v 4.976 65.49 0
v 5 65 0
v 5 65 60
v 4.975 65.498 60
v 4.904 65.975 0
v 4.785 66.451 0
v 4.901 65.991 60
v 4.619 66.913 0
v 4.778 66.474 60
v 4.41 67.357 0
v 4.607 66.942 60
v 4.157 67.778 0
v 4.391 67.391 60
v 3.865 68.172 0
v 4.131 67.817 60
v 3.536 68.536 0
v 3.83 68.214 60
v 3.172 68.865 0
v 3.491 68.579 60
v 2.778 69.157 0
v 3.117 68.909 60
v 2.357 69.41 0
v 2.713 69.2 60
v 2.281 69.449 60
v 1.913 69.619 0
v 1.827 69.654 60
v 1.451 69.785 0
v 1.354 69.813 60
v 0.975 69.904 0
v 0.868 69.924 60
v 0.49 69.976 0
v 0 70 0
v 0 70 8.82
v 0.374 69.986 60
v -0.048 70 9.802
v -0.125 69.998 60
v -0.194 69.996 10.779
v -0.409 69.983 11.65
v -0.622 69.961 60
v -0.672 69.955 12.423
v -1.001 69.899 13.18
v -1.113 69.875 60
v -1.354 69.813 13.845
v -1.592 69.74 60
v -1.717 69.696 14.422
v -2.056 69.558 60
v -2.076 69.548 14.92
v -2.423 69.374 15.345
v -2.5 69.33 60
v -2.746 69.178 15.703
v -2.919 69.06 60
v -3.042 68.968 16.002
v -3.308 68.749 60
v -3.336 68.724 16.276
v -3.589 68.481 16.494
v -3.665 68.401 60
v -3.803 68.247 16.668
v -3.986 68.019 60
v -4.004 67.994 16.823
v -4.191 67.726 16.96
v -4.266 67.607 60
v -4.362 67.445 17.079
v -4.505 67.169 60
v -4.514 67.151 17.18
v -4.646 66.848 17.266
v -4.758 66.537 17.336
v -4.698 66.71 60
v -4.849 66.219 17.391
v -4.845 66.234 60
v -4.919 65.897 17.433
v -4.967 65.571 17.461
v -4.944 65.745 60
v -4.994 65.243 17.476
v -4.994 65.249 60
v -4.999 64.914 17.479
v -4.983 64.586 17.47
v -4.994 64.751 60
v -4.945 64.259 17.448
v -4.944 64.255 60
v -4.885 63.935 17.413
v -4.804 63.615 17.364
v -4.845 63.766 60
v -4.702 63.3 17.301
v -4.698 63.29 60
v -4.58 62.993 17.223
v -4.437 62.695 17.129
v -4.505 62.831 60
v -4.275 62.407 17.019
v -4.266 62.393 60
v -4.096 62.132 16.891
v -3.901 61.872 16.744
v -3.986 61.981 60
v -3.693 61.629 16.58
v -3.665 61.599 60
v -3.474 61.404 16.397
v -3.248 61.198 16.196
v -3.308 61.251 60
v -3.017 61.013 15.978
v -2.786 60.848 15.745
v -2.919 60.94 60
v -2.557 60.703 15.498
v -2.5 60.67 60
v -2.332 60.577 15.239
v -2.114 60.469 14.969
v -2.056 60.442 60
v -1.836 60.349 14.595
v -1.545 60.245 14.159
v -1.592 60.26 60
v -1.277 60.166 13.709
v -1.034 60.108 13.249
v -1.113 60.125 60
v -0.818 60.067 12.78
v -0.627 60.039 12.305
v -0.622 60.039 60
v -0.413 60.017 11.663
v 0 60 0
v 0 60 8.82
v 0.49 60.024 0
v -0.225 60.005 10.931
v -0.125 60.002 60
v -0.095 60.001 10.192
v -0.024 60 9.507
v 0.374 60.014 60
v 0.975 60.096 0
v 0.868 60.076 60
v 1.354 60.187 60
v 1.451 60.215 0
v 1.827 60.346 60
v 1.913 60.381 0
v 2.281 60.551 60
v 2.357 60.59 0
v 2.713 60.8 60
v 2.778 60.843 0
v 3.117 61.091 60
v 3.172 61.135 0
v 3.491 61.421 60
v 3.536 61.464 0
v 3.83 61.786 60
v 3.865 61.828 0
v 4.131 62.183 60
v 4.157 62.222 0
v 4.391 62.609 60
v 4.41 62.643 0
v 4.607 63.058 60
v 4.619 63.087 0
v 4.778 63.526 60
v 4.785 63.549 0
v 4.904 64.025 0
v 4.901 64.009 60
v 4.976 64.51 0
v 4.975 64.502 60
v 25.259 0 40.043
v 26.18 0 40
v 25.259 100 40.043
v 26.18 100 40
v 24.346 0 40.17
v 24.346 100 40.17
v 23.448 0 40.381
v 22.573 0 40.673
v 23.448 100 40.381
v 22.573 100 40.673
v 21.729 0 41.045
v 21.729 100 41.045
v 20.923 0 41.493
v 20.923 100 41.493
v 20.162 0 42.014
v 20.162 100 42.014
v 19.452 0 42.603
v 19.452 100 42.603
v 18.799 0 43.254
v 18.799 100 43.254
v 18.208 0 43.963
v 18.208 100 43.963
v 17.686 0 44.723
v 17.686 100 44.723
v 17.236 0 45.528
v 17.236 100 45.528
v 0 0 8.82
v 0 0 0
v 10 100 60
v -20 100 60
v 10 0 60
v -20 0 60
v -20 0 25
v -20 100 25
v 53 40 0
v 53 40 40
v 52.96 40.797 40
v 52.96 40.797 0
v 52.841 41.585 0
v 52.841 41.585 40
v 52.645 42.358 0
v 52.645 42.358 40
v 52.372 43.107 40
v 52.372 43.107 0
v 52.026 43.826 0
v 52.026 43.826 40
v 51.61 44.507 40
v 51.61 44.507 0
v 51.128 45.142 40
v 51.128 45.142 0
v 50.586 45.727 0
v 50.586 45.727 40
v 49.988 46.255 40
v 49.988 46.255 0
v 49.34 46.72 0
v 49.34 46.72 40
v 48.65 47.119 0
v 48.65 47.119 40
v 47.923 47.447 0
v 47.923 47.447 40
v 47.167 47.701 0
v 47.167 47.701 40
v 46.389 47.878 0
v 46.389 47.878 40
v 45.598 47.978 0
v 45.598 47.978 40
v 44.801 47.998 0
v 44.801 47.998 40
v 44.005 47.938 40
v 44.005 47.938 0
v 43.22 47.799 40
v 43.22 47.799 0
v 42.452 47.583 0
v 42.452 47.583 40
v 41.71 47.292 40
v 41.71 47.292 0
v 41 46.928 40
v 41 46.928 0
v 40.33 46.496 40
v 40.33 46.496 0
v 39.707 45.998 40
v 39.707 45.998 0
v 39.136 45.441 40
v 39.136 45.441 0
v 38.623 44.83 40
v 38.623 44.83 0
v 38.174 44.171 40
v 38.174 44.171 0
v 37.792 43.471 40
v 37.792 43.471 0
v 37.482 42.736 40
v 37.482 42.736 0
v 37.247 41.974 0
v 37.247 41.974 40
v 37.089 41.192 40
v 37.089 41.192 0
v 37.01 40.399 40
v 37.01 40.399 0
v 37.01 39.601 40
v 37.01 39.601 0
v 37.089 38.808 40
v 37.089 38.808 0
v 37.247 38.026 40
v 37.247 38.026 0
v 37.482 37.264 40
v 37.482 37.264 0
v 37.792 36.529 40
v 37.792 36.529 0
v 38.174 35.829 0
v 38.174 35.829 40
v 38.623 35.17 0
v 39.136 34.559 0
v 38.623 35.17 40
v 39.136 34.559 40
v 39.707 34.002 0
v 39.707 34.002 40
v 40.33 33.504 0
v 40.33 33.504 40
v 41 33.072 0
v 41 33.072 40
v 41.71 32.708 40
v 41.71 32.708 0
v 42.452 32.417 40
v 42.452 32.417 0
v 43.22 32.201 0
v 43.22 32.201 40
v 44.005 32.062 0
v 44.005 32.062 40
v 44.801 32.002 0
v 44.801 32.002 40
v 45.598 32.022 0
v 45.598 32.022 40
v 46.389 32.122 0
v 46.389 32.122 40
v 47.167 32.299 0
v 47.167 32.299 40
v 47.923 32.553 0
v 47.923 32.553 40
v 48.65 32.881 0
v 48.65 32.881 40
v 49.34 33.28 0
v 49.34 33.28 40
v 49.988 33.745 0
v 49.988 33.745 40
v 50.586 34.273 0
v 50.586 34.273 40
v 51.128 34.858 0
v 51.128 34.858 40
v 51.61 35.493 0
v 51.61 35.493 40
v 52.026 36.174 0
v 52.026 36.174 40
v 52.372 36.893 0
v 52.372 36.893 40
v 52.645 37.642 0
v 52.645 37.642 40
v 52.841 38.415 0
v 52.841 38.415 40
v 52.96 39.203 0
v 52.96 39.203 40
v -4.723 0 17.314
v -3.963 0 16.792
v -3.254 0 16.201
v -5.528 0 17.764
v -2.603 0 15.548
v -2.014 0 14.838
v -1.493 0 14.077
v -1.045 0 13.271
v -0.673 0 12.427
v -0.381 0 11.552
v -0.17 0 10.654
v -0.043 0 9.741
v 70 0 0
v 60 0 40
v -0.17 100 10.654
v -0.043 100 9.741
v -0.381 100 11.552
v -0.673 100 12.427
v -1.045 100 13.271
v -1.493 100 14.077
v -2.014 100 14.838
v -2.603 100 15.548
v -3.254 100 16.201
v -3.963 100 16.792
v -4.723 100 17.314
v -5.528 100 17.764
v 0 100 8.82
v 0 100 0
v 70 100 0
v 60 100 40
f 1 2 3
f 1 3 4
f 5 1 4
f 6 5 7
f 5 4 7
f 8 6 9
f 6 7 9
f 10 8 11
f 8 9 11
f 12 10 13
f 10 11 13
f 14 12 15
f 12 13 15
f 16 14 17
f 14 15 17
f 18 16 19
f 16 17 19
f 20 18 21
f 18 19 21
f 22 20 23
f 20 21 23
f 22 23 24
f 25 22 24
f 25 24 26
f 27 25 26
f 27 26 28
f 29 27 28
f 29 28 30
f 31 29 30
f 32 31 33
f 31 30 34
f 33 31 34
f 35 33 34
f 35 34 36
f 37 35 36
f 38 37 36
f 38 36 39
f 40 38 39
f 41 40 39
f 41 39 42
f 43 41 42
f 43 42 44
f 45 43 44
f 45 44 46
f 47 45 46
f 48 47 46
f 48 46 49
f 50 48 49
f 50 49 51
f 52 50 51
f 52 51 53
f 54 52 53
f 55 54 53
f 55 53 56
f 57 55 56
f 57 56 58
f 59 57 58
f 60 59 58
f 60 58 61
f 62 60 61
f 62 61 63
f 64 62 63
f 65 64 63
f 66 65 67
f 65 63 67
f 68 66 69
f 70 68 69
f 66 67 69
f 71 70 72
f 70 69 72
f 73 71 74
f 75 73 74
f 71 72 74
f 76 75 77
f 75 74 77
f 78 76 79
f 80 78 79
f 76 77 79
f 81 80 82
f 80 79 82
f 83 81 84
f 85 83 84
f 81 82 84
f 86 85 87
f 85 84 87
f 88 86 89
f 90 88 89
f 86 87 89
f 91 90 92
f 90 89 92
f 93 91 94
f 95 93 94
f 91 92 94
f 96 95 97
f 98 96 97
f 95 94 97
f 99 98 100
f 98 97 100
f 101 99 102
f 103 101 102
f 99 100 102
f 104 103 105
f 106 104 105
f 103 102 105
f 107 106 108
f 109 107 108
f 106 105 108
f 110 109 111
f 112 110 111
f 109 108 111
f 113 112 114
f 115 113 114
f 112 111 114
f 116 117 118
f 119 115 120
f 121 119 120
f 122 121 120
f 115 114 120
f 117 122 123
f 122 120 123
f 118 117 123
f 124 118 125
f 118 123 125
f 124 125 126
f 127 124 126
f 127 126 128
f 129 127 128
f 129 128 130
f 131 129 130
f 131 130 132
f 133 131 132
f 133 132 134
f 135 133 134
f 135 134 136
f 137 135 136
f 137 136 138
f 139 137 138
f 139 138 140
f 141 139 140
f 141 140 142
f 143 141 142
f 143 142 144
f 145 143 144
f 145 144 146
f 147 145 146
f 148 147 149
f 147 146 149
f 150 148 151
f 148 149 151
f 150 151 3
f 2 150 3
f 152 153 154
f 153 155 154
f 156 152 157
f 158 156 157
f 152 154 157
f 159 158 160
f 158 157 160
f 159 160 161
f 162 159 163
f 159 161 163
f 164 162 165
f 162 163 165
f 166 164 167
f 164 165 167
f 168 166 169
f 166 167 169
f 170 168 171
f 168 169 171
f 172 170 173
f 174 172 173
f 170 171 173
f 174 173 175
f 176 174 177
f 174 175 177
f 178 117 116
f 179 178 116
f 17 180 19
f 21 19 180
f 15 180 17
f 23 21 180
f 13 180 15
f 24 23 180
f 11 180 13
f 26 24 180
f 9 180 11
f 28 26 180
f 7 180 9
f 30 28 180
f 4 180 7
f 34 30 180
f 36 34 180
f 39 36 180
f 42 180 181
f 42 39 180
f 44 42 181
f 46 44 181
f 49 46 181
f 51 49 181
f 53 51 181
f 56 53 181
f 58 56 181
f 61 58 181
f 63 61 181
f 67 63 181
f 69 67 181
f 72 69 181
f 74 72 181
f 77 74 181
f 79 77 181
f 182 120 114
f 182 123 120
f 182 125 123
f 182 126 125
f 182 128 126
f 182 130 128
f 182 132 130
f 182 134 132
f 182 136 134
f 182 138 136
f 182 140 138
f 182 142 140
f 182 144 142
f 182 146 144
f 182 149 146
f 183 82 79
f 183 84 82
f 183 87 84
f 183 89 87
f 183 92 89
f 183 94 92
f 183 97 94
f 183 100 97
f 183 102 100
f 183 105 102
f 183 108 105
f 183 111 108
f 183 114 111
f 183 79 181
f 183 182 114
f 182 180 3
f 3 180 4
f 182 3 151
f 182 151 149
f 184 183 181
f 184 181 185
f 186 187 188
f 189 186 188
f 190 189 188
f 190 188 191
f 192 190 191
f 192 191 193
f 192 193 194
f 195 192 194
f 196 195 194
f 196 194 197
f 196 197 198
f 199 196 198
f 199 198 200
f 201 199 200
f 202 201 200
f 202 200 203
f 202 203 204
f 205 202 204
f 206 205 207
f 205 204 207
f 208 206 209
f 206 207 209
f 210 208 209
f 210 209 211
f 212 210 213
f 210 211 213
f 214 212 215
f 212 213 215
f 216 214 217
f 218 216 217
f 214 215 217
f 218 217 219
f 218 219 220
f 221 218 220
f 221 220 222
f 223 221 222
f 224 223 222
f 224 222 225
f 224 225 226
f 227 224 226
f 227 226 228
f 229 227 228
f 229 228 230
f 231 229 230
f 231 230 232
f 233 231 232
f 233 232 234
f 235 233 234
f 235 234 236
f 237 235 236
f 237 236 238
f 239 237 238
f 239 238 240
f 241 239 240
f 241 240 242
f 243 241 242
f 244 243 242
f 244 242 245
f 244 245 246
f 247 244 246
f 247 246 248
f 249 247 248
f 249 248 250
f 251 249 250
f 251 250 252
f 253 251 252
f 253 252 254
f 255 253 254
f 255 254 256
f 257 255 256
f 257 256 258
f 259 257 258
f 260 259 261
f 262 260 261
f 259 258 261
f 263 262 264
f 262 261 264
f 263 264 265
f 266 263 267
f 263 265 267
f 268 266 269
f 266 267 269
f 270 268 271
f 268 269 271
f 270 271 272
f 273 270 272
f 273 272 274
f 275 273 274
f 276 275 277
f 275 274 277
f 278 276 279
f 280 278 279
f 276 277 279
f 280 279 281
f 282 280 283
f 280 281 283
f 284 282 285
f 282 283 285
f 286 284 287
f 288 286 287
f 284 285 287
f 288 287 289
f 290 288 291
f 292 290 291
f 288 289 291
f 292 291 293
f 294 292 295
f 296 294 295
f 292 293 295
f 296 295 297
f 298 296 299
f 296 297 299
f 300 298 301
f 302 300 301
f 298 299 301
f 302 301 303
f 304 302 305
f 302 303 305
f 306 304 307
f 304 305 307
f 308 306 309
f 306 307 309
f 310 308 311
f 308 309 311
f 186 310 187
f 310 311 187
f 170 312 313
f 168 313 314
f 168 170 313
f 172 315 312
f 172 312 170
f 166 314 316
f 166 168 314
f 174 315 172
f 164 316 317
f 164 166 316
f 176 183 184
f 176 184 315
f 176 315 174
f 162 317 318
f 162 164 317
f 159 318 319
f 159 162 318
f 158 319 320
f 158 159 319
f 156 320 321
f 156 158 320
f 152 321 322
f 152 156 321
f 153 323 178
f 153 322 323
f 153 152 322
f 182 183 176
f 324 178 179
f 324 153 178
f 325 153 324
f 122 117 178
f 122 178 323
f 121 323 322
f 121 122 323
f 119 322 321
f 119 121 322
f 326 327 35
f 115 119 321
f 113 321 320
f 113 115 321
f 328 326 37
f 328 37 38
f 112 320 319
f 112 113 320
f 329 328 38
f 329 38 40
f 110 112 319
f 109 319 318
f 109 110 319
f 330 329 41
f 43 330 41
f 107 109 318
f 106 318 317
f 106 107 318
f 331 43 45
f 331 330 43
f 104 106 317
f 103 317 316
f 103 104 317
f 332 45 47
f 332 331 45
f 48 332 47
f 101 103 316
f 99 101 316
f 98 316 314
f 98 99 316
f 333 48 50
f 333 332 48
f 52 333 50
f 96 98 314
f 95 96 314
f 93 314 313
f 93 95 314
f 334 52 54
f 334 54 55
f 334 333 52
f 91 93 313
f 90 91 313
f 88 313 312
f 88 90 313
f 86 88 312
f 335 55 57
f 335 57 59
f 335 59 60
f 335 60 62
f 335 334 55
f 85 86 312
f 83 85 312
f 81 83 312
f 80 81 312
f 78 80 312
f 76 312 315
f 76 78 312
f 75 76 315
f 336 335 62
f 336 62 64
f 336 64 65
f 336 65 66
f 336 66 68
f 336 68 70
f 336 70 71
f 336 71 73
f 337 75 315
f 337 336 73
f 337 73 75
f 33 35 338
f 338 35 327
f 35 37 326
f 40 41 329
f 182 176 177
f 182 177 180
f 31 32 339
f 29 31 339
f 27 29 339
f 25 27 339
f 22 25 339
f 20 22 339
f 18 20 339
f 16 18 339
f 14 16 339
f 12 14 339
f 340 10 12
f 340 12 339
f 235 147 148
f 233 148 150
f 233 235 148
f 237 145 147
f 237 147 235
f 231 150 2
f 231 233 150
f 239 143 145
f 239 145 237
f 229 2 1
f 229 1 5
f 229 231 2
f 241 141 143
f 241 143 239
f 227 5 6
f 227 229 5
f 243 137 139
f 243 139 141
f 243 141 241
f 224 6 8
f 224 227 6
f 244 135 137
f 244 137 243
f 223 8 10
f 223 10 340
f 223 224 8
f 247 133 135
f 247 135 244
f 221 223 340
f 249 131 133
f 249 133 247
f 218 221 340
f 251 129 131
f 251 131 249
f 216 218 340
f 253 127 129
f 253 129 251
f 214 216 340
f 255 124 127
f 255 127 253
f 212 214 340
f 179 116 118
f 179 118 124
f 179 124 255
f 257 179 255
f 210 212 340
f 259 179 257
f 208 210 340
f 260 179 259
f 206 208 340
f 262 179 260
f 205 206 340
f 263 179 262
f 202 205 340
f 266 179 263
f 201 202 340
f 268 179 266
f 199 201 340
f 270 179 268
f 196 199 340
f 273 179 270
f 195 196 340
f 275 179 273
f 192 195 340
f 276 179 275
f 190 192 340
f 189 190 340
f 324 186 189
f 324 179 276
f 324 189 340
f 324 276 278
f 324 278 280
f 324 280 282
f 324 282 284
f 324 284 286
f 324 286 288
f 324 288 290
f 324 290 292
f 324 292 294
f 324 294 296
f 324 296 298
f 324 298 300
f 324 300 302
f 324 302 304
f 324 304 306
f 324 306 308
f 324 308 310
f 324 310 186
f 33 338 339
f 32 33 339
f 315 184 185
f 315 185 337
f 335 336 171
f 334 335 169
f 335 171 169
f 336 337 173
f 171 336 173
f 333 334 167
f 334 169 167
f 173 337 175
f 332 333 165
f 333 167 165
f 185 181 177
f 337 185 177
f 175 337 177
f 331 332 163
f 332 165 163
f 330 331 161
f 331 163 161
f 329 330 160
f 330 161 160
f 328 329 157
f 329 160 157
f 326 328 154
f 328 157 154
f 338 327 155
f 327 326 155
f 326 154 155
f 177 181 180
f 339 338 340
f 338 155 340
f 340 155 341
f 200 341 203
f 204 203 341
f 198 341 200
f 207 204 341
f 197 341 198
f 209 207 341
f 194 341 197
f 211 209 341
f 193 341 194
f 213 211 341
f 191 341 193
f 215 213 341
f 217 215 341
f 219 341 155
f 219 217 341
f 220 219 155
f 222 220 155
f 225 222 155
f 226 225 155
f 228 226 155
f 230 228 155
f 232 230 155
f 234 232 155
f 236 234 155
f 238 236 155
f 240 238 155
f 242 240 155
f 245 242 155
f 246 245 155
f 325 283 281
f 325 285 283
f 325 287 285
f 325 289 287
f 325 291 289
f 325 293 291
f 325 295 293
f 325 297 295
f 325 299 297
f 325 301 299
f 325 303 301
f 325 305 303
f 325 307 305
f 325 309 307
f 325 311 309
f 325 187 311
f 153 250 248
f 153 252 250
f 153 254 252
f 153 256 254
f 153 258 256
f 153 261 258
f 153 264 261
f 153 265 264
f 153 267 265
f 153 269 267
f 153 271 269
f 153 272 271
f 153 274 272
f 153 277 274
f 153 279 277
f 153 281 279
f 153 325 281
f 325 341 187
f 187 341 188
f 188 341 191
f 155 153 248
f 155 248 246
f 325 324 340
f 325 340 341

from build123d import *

# Parameters (mm, degrees)
F1_DEPTH = 100
F2_R     = 10
F3_R     = 5
F3_R_2   = 8
F4_DEPTH = 60.001


with BuildPart() as f1:
    # F0 (on Front) → F1 (new body)
    with BuildSketch(Plane.XZ):
        Polygon((0, 15), (0, 0), (70, 0), (60, 40), (20, 40), (10, 60), (-20, 60), (-20, 25), align=None)
    extrude(amount=-F1_DEPTH)

    # F2
    f2_edges = [f1.edges().sort_by_distance(p)[0] for p in [
        (20, 50, 40),
        (0, 50, 15),
    ]]
    fillet(f2_edges, radius=F2_R)

    # F3 (on face) → F4 (cut, through all)
    with BuildSketch(Plane.XY.offset(60)):
        with Locations((0, 65)):
            Circle(F3_R)
        with Locations((45, 40)):
            Circle(F3_R_2)
    extrude(amount=-F4_DEPTH, mode=Mode.SUBTRACT)


solid = f1.part
